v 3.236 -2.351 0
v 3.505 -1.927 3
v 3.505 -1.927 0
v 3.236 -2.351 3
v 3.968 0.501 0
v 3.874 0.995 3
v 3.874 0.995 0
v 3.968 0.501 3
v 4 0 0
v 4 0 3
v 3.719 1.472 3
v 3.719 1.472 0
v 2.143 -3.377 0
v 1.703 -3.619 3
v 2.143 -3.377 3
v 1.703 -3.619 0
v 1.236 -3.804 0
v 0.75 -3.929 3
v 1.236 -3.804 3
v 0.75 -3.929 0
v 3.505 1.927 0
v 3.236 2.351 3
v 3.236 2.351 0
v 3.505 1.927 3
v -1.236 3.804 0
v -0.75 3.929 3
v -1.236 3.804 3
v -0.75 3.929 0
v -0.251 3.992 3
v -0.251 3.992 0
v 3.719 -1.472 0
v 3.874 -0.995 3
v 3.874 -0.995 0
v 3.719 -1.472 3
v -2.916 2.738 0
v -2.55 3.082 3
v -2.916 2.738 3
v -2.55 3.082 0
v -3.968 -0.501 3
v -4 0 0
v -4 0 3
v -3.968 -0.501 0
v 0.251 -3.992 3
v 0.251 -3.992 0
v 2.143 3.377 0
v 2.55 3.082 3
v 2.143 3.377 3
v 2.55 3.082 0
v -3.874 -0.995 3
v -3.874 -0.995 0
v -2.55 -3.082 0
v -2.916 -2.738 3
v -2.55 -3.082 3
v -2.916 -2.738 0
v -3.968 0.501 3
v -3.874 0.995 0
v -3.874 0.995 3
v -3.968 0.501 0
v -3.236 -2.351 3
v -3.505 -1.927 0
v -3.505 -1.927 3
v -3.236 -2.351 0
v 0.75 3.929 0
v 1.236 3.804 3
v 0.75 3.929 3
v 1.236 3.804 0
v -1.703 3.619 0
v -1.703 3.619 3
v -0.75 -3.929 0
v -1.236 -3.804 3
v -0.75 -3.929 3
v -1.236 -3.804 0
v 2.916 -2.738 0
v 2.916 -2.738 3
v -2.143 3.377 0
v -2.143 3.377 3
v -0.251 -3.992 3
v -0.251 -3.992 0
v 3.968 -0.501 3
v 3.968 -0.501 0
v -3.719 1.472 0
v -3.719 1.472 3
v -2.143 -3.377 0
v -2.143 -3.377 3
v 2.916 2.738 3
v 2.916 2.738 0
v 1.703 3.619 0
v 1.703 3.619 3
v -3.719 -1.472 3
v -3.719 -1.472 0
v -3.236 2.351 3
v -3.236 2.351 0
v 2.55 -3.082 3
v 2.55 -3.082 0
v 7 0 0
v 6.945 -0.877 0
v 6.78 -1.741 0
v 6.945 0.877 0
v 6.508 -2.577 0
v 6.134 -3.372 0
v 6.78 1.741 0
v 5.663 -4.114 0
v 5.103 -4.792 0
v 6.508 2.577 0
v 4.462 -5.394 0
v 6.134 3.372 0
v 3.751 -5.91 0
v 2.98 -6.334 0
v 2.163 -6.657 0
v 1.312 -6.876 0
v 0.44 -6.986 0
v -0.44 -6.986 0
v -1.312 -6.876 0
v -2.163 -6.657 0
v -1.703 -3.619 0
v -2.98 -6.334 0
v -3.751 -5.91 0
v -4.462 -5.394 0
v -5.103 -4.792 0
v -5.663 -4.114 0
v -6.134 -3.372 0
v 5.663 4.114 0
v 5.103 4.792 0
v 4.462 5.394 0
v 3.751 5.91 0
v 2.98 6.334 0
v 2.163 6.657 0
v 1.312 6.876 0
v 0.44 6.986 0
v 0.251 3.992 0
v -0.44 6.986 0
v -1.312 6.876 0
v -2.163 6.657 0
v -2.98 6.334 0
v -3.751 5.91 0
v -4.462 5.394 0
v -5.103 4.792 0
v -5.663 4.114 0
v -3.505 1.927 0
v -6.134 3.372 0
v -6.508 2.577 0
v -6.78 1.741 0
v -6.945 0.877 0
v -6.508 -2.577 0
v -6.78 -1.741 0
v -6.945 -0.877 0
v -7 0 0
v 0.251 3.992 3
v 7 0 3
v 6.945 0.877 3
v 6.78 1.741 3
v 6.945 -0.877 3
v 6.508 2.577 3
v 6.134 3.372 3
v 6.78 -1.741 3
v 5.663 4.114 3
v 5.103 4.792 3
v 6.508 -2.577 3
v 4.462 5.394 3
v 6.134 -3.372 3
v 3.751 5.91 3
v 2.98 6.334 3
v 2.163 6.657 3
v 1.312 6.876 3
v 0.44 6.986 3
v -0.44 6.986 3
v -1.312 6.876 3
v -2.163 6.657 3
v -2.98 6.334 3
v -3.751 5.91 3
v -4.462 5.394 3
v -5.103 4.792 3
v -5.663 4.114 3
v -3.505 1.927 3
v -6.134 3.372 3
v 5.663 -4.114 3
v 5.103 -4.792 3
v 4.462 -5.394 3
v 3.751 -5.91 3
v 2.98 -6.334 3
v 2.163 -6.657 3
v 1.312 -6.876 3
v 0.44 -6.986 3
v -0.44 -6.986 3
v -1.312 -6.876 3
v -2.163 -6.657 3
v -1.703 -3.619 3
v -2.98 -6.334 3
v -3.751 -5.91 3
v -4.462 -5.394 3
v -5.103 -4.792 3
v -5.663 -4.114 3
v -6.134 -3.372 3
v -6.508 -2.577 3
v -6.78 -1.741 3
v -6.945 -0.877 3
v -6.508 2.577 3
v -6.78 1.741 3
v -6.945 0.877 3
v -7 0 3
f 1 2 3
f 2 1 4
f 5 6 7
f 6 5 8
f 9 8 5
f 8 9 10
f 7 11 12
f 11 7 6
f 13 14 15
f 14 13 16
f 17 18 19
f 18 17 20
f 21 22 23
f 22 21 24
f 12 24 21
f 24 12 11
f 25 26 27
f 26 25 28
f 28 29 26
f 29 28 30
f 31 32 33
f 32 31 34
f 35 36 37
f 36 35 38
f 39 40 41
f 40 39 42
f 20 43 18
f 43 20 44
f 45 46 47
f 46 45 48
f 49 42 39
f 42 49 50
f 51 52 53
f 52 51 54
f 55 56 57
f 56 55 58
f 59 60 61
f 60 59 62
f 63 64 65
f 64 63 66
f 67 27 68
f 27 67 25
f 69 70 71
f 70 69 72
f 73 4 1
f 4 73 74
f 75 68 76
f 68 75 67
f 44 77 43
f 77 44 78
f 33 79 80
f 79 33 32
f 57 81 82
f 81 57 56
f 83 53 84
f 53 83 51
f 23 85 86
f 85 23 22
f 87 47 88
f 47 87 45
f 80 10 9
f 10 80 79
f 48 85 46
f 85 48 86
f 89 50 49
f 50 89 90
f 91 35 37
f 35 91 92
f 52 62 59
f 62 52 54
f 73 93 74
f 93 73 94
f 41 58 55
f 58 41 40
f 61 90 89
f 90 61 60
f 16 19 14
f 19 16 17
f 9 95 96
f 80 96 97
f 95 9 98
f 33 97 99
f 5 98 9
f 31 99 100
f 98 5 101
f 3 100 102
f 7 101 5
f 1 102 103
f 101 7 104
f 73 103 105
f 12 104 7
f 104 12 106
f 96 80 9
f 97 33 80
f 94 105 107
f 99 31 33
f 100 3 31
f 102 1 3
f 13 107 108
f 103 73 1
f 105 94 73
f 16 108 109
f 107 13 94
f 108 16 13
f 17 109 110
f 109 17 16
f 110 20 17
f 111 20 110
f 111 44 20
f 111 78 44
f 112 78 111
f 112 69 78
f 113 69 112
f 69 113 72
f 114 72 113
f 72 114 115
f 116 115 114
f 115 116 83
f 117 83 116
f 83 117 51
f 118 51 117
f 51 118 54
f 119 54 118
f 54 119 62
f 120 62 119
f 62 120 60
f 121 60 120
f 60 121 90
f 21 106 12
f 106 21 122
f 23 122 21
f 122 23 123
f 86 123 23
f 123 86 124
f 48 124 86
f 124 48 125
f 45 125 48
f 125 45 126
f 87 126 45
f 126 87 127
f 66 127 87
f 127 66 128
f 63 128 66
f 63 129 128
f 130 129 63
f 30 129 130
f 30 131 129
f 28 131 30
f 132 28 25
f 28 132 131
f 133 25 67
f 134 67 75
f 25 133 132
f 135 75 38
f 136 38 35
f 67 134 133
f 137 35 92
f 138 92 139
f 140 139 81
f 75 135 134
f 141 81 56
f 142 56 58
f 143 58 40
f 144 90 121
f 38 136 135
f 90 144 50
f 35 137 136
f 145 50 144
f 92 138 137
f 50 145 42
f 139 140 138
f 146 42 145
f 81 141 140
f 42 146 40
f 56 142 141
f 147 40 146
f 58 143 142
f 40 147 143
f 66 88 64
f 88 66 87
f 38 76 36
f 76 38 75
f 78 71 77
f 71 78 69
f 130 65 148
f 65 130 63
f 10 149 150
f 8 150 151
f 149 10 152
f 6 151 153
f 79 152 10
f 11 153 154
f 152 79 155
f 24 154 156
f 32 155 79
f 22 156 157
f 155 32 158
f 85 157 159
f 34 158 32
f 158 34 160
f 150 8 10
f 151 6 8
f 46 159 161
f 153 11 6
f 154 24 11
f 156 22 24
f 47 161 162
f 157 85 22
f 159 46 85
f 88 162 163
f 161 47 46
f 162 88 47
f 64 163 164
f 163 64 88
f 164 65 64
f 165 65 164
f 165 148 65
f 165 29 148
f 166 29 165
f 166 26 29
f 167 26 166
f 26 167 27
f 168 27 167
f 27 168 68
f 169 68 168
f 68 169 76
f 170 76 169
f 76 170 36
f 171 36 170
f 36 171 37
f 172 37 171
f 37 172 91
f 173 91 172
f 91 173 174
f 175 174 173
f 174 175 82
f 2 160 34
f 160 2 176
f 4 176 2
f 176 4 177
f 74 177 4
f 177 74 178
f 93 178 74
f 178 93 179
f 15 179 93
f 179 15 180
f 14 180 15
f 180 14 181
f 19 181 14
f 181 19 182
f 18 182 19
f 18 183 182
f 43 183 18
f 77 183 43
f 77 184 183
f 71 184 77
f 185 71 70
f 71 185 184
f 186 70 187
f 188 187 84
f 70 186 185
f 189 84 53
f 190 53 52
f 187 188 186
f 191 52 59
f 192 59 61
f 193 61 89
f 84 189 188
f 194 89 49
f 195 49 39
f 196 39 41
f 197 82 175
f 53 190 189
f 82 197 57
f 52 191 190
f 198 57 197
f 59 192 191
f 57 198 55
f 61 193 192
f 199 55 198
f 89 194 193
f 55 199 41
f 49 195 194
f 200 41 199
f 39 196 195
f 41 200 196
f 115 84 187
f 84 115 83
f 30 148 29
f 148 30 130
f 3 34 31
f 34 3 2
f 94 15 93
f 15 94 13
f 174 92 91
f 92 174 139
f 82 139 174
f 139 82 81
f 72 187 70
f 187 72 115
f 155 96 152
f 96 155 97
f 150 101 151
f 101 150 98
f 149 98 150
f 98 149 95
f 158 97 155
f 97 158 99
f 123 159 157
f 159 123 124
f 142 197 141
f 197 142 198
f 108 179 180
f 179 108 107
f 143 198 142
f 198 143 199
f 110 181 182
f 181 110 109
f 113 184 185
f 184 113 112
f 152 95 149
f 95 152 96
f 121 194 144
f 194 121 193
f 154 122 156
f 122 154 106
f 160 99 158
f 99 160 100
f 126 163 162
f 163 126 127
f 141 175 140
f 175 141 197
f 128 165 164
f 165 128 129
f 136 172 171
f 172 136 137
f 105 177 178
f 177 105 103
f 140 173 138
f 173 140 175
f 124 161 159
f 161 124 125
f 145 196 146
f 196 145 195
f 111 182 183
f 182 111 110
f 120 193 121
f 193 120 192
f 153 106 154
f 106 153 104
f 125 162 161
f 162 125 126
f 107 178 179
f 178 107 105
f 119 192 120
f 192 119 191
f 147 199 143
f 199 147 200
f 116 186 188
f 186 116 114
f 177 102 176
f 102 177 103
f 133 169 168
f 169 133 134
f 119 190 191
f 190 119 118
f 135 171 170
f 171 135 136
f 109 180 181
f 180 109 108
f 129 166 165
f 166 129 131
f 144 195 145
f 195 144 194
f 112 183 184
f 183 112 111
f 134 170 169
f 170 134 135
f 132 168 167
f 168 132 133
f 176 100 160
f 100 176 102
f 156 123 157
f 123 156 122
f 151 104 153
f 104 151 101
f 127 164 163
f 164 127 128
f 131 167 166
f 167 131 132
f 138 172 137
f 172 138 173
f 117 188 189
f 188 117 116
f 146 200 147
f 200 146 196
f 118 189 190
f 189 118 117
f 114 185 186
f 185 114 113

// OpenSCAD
$fn = 50;

difference() {
	union() {
		cylinder(h = 3, r = 7.0);
	}
	union() {
		translate(v = [0.0, 0.0, -100.0]) {
			cylinder(h = 200, r = 3.25);
		}
		translate(v = [0.0, 0.0, -100.0]) {
			cylinder(h = 200, r = 1.8);
		}
		cylinder(h = 3, r = 4.0);
	}
}
